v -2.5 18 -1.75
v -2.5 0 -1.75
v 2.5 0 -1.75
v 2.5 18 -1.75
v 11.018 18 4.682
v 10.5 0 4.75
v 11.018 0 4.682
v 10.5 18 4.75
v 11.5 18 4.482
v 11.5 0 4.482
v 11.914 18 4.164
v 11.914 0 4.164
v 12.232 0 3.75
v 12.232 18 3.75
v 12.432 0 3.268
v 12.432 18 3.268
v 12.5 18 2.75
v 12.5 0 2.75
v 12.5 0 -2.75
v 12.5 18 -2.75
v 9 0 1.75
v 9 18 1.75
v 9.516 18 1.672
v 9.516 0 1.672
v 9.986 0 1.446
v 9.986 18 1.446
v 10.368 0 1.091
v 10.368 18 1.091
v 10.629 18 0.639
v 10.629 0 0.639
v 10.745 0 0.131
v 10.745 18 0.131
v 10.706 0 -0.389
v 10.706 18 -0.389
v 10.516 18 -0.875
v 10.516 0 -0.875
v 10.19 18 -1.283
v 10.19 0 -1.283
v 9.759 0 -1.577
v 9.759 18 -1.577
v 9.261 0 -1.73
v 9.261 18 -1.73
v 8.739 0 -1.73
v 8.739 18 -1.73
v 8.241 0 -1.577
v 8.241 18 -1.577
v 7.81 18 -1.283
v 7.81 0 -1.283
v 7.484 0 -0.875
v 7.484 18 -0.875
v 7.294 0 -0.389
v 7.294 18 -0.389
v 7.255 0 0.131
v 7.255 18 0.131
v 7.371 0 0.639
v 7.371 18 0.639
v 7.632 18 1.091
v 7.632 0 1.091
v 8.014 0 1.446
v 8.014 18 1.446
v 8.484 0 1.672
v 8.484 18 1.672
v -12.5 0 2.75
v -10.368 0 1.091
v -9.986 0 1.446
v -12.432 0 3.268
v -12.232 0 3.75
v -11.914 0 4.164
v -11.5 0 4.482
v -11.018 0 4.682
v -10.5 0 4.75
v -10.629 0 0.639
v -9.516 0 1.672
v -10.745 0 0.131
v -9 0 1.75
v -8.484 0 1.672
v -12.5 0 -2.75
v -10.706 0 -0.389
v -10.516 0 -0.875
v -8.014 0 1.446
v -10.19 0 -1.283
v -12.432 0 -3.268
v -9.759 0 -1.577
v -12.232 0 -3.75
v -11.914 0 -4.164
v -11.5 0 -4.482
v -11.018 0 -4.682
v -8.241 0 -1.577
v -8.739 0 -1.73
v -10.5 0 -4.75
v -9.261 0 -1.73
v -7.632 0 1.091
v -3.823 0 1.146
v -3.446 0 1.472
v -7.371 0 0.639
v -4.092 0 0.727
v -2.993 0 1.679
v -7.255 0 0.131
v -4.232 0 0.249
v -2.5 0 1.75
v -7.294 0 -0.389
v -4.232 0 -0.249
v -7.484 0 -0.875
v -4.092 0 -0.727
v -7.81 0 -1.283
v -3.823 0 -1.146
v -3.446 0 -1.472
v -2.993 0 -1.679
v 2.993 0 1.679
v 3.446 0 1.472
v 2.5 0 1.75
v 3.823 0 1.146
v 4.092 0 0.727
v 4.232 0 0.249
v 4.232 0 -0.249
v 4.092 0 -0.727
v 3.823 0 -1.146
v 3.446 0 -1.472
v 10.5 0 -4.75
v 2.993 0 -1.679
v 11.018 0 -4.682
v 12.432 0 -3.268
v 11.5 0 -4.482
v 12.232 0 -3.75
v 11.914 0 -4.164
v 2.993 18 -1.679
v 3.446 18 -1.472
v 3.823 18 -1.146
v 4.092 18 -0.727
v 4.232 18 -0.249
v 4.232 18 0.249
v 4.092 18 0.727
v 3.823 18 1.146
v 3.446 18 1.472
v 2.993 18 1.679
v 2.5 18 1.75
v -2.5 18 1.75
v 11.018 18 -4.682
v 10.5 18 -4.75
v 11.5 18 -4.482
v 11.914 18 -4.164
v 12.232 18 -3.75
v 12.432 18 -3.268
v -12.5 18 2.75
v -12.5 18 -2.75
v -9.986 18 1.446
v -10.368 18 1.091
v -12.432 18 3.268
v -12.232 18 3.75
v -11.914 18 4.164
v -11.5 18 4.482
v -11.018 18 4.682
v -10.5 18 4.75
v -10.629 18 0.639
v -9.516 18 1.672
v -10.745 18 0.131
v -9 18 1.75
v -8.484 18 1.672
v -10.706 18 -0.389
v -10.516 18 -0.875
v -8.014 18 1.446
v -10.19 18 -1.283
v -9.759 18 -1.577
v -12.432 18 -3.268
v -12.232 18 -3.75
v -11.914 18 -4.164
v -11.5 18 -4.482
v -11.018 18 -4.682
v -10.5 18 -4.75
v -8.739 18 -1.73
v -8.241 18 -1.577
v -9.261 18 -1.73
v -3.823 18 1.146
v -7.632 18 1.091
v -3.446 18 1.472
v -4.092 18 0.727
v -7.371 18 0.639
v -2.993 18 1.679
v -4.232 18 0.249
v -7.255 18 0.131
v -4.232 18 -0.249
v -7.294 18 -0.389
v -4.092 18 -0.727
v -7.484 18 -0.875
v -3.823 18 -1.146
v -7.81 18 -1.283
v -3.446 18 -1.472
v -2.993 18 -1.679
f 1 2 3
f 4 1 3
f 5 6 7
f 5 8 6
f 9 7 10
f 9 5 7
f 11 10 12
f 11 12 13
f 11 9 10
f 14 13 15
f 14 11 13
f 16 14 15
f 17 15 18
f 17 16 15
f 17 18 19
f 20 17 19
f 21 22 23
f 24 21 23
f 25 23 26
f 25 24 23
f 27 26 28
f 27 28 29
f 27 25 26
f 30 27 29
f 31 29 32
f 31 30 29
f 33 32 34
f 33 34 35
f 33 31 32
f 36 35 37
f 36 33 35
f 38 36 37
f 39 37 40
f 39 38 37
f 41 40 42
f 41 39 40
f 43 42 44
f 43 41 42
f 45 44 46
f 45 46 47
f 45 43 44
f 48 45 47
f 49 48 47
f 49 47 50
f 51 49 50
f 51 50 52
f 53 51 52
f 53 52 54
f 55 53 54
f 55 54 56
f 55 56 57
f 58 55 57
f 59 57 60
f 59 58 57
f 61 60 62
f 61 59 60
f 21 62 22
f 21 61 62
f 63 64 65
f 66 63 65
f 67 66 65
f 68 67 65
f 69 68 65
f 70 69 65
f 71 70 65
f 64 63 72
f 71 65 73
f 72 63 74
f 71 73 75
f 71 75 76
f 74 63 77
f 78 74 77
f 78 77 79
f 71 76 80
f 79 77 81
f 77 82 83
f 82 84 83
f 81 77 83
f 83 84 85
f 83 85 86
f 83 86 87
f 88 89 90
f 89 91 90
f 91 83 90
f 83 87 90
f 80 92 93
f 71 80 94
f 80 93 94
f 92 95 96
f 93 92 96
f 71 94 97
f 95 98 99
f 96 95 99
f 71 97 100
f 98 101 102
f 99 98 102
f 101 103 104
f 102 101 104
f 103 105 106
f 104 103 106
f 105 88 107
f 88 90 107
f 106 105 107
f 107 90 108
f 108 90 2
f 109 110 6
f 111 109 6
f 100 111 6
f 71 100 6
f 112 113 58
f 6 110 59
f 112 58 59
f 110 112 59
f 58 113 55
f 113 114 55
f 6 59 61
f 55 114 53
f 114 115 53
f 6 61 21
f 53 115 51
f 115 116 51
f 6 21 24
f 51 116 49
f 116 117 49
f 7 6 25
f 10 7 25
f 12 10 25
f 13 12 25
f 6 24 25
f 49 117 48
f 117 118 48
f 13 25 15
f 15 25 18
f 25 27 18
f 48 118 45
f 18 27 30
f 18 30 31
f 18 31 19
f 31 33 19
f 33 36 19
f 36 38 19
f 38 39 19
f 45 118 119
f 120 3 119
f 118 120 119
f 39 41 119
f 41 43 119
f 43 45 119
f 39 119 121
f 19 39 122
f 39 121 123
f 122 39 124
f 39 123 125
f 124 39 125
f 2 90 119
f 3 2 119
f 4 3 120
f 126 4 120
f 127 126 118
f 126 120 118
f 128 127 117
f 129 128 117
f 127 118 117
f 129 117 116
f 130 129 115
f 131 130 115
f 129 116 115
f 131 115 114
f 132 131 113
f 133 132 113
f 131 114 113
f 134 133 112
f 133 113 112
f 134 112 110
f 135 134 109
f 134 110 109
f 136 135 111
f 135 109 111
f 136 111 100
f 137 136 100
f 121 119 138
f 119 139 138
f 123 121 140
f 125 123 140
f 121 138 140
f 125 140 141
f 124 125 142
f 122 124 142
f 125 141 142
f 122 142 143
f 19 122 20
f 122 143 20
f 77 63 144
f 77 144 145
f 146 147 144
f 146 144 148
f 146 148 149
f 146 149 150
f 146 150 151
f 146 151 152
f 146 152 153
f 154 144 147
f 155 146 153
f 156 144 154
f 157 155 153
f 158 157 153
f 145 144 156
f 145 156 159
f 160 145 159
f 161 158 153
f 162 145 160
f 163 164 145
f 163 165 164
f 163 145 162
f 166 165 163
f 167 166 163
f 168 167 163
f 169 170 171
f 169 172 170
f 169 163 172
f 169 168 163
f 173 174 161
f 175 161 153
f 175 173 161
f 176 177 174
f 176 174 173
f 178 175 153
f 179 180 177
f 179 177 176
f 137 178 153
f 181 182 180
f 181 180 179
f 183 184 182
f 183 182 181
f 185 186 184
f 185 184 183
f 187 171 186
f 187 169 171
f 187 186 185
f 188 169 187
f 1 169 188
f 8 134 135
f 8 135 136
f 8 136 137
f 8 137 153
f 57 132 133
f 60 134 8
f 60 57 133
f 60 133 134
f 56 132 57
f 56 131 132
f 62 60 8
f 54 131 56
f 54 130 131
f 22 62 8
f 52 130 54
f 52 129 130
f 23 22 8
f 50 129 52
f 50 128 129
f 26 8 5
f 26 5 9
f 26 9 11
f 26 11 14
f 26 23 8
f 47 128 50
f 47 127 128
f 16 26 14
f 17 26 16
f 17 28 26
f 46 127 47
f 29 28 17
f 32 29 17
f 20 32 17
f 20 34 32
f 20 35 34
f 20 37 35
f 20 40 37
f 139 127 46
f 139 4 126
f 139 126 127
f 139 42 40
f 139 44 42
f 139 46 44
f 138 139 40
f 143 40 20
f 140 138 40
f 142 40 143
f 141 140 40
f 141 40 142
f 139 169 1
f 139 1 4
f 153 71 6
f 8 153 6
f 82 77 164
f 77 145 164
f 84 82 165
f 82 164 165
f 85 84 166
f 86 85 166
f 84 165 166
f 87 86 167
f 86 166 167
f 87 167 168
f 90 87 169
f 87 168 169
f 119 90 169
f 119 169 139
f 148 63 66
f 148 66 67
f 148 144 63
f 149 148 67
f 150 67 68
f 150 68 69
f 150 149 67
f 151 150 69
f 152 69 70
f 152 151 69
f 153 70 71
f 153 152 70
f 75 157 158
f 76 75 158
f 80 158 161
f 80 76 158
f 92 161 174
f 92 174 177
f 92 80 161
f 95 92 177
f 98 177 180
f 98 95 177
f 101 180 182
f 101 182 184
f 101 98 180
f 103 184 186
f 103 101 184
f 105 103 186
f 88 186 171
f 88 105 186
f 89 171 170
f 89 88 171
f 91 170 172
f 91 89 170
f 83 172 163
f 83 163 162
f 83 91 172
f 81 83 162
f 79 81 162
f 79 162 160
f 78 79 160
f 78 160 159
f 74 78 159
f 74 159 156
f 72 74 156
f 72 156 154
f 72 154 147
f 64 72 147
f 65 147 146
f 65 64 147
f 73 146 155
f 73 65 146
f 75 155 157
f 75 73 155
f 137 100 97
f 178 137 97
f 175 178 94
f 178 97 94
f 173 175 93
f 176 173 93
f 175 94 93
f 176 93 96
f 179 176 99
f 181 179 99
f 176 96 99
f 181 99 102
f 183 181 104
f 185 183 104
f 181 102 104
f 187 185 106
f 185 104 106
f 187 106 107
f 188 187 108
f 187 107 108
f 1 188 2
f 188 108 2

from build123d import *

# Parameters (mm, degrees)
SKETCH_1_W      = 25
SKETCH_1_H      = 9.5
SKETCH_1_R      = 1.75
EXTRUDE_1_DEPTH = 18
FILLET_1_R      = 2


with BuildPart() as part:
    # 草图1 → 凸台-拉伸1 (new body)
    with BuildSketch(Plane(origin=(0, 0, 0), x_dir=(1, 0, 0), z_dir=(0, 1, 0))):
        Rectangle(SKETCH_1_W, SKETCH_1_H)
        with Locations(Location((-9, 0, 0), (0, 0, 270))):
            Circle(SKETCH_1_R, mode=Mode.SUBTRACT)
        with Locations(Location((9, 0, 0), (0, 0, 270))):
            Circle(SKETCH_1_R, mode=Mode.SUBTRACT)
        with BuildLine():
            Line((-2.5, 1.75), (2.5, 1.75))
            ThreePointArc((2.5, 1.75), (4.25, 0), (2.5, -1.75))
            Line((2.5, -1.75), (-2.5, -1.75))
            ThreePointArc((-2.5, -1.75), (-4.25, 0), (-2.5, 1.75))
        make_face(mode=Mode.SUBTRACT)
    extrude(amount=EXTRUDE_1_DEPTH)

    # 圆角1
    fillet_1_edges = [part.edges().sort_by_distance(p)[0] for p in [
        (12.5, 9, 4.75),
        (-12.5, 9, 4.75),
        (-12.5, 9, -4.75),
        (12.5, 9, -4.75),
    ]]
    fillet(fillet_1_edges, radius=FILLET_1_R)


solid = part.part
